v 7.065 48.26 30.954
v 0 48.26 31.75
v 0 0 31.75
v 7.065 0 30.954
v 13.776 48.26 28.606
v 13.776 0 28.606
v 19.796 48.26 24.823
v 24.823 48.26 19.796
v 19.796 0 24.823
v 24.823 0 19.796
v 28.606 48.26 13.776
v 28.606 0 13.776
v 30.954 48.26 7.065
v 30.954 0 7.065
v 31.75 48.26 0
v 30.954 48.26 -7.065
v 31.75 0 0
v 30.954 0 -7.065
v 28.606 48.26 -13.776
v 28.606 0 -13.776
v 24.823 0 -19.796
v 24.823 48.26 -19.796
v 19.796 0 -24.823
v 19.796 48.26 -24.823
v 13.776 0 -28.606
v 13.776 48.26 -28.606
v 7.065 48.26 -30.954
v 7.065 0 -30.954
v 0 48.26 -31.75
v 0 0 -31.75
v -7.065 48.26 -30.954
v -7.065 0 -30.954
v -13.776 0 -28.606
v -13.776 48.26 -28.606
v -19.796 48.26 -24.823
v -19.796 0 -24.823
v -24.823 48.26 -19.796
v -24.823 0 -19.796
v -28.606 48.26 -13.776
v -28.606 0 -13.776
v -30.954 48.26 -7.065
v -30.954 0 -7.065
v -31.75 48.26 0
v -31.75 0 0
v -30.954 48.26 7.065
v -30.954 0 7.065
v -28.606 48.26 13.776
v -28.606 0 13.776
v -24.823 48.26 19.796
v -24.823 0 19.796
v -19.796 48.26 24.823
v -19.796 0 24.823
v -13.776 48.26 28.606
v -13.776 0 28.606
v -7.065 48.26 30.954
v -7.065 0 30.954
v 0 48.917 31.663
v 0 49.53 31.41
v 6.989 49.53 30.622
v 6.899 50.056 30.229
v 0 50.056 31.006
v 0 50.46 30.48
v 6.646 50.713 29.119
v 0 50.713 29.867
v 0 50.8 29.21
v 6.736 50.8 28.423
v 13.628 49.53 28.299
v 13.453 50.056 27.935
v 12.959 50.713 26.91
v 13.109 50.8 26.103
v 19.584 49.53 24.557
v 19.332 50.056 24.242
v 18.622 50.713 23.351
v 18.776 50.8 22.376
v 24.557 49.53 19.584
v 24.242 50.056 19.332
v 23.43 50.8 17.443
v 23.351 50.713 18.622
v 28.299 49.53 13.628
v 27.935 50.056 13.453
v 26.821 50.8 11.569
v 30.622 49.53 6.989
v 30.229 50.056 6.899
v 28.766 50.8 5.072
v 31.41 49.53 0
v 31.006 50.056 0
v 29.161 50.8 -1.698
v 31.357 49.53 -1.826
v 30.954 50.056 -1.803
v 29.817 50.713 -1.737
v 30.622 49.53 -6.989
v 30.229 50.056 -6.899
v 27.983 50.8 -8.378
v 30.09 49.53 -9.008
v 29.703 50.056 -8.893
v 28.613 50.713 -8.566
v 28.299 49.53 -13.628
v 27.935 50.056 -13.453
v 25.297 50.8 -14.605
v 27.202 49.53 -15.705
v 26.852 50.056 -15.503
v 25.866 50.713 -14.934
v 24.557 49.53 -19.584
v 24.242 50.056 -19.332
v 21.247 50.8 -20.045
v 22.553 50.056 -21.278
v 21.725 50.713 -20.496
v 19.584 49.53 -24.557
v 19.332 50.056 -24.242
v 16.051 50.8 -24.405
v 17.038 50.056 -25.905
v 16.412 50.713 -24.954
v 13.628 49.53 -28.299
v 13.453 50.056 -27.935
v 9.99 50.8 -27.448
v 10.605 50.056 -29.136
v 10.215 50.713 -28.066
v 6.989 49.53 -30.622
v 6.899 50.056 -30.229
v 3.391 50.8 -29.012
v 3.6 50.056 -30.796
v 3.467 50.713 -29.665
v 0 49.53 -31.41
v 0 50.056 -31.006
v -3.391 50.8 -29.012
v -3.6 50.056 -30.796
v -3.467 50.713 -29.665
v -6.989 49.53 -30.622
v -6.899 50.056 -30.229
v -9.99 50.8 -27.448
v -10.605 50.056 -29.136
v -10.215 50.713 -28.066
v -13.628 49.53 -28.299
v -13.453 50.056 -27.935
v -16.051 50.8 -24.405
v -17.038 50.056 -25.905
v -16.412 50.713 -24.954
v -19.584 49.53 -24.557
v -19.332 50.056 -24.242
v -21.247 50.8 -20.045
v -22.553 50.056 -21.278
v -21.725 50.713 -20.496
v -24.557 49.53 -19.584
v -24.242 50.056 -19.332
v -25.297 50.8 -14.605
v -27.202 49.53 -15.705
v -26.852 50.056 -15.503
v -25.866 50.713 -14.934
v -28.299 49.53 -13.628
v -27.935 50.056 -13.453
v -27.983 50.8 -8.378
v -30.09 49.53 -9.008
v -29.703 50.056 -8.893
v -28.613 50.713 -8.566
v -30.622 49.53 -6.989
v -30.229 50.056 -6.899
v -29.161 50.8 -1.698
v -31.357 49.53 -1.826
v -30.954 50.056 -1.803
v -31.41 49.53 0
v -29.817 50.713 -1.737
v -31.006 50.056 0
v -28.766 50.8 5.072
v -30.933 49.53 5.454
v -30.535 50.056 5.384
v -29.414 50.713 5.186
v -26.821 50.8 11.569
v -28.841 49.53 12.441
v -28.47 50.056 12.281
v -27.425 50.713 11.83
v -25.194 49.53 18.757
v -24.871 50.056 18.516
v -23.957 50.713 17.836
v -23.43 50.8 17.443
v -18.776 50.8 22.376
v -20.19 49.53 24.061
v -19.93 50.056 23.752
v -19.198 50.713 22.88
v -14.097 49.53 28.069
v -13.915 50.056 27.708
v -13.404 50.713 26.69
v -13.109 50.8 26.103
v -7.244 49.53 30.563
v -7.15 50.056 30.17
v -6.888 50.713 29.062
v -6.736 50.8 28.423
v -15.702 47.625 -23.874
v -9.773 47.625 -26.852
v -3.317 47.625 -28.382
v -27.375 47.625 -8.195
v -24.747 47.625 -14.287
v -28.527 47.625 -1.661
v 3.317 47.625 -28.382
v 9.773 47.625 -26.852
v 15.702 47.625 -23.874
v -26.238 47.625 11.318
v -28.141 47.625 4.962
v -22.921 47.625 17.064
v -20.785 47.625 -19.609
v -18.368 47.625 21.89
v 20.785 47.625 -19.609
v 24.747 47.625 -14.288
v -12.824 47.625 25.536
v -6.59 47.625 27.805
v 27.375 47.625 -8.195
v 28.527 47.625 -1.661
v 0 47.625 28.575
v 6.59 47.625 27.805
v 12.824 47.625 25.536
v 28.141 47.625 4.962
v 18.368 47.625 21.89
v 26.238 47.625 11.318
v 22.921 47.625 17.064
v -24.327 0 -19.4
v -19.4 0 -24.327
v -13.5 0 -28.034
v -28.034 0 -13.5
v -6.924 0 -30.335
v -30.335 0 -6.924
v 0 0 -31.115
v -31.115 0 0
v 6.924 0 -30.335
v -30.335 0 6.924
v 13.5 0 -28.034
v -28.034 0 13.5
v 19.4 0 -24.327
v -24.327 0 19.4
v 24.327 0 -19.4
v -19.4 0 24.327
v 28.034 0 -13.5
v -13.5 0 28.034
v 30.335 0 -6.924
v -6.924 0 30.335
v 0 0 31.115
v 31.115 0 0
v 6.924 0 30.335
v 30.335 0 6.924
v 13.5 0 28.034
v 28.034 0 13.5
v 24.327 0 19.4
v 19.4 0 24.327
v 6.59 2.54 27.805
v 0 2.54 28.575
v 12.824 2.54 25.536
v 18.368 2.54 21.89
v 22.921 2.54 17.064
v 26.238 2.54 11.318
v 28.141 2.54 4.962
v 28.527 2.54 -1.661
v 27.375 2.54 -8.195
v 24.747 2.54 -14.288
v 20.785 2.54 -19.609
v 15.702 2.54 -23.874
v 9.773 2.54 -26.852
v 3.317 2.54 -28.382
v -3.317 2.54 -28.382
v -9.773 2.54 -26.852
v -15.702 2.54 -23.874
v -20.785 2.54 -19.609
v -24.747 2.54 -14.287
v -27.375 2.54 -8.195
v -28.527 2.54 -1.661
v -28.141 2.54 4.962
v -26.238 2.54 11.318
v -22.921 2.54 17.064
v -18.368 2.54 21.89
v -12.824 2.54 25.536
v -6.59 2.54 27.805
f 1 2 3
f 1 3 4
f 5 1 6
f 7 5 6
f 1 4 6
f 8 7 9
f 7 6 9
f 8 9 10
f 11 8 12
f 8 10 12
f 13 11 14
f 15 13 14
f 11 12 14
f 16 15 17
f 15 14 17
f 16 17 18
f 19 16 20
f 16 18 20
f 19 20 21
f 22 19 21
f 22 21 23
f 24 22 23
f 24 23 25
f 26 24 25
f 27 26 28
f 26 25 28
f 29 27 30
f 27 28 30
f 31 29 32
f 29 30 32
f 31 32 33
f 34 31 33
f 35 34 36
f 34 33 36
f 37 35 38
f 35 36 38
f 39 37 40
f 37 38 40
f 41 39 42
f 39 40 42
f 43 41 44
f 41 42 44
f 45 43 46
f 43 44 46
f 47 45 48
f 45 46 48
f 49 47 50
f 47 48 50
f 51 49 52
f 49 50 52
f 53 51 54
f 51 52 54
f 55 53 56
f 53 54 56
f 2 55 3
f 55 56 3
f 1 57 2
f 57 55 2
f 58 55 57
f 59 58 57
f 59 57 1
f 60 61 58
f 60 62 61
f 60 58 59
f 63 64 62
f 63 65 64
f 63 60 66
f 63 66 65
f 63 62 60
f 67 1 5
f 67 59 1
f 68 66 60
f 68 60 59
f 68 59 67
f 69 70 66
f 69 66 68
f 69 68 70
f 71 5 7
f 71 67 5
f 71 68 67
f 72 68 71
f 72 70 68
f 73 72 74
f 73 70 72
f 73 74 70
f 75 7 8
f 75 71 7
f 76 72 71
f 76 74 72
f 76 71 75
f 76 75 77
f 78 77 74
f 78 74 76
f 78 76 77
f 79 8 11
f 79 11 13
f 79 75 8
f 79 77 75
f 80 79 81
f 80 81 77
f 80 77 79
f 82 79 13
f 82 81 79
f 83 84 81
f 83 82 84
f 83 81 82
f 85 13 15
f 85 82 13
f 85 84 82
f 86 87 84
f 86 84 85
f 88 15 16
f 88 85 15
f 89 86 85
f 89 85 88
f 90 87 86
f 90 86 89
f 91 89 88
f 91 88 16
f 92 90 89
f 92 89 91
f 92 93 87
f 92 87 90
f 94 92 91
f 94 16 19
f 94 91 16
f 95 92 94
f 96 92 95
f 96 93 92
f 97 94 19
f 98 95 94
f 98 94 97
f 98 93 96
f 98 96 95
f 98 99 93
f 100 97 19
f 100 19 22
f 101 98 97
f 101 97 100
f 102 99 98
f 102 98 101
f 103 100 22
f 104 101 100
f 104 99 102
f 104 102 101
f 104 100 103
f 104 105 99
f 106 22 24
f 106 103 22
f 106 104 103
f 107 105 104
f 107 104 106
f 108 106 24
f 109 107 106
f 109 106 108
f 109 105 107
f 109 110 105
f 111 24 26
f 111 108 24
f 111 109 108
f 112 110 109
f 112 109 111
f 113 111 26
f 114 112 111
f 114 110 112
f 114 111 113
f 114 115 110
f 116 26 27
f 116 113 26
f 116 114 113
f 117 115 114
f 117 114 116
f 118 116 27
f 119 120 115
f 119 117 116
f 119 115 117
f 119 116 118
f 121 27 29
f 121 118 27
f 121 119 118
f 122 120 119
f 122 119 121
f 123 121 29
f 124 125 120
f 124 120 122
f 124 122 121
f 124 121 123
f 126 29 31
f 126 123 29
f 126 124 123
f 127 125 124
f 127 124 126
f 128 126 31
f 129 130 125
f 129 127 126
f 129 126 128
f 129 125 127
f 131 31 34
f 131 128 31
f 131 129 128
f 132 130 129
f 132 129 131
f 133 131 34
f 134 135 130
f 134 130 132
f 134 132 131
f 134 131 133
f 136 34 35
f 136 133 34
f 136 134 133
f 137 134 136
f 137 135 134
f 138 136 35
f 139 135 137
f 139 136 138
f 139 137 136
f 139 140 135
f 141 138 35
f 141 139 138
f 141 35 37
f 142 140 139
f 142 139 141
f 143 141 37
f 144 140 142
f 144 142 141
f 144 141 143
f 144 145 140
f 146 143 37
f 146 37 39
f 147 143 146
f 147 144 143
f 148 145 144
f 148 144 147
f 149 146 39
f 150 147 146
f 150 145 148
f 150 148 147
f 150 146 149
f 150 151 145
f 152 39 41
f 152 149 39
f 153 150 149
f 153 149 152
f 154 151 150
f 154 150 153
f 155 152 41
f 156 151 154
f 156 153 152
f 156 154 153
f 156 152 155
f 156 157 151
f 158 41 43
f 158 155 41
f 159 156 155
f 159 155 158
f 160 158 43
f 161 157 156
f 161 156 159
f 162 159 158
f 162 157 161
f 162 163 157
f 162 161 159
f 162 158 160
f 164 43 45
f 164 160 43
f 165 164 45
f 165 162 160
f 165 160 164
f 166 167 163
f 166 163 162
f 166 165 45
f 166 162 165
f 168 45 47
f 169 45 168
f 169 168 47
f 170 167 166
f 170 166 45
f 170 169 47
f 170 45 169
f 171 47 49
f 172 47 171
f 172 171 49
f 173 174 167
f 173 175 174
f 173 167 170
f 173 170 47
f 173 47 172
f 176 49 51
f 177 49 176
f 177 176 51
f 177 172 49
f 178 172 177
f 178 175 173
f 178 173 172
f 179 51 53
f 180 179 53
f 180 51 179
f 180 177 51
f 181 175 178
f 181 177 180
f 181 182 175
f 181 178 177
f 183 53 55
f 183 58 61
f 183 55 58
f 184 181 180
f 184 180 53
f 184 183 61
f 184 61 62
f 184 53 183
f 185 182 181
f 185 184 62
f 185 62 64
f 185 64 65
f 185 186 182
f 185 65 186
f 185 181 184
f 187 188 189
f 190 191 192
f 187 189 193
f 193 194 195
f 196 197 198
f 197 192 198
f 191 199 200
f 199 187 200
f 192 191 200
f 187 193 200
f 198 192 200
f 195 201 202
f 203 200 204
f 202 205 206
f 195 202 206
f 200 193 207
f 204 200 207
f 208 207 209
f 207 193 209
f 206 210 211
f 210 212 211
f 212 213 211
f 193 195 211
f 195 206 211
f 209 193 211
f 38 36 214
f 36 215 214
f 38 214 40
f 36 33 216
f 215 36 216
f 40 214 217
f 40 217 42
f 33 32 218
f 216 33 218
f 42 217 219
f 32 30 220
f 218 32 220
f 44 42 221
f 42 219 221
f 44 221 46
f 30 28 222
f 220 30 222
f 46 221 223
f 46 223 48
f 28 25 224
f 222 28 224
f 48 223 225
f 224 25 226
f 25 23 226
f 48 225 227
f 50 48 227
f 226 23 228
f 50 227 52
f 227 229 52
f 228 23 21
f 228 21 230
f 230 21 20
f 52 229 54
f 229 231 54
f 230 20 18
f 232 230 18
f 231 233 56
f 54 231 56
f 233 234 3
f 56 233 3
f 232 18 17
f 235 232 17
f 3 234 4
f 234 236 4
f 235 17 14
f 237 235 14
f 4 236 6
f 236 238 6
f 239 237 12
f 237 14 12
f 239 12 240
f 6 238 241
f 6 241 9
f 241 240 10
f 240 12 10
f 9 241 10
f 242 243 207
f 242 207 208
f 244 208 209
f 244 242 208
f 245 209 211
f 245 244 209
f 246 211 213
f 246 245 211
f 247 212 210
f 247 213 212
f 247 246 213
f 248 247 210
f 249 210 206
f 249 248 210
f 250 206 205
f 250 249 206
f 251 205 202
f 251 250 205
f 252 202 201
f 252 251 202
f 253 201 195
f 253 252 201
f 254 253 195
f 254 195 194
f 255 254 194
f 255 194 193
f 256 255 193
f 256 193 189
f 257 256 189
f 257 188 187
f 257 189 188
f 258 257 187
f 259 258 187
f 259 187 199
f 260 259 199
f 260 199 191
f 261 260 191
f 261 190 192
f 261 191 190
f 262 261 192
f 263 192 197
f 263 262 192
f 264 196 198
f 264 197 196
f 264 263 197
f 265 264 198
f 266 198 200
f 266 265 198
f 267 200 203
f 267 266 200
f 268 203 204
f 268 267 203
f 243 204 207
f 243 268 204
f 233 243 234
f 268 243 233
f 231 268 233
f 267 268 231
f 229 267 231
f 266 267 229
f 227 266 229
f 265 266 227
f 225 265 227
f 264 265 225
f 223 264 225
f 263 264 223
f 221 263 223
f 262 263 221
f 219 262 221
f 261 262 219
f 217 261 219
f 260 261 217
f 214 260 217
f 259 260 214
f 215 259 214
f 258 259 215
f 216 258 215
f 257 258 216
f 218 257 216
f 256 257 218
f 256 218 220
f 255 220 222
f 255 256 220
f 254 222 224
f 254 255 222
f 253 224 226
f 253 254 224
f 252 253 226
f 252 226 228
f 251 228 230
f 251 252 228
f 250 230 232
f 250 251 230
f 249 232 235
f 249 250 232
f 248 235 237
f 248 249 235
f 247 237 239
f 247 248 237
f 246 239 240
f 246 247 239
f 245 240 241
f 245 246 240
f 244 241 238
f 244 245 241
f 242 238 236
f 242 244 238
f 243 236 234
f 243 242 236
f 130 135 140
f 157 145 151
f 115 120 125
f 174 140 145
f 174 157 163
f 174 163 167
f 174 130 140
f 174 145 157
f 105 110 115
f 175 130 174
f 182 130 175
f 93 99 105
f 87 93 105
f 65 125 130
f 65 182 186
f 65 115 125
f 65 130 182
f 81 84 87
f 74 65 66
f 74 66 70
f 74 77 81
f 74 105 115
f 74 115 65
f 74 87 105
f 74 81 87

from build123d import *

# Parameters (mm, degrees)
SKETCH2_R           = 31.75
BOSS_EXTRUDE2_DEPTH = 50.8
SHELL1_T            = -3.175
FILLET2_R           = 2.54
CHAMFER1_SIZE       = 2.54


with BuildPart() as part:
    # Sketch2 → Boss-Extrude2 (new body)
    with BuildSketch(Plane(origin=(0, 0, 0), x_dir=(1, 0, 0), z_dir=(0, 1, 0))):
        with Locations(Location((0, 0, 0), (0, 0, 270))):
            Circle(SKETCH2_R)
    extrude(amount=BOSS_EXTRUDE2_DEPTH)

    # Shell1
    shell1_openings = [part.faces().sort_by_distance(p)[0] for p in [
        (0, 0, 0),
    ]]
    offset(amount=SHELL1_T, openings=shell1_openings, kind=Kind.INTERSECTION)

    # Fillet2
    fillet2_edges = [part.edges().sort_by_distance(p)[0] for p in [
        (0, 50.8, -31.75),
    ]]
    fillet(fillet2_edges, radius=FILLET2_R)

    # Chamfer1
    chamfer1_edges = [part.edges().sort_by_distance(p)[0] for p in [
        (0, 0, -28.575),
    ]]
    chamfer(chamfer1_edges, length=CHAMFER1_SIZE)


solid = part.part
